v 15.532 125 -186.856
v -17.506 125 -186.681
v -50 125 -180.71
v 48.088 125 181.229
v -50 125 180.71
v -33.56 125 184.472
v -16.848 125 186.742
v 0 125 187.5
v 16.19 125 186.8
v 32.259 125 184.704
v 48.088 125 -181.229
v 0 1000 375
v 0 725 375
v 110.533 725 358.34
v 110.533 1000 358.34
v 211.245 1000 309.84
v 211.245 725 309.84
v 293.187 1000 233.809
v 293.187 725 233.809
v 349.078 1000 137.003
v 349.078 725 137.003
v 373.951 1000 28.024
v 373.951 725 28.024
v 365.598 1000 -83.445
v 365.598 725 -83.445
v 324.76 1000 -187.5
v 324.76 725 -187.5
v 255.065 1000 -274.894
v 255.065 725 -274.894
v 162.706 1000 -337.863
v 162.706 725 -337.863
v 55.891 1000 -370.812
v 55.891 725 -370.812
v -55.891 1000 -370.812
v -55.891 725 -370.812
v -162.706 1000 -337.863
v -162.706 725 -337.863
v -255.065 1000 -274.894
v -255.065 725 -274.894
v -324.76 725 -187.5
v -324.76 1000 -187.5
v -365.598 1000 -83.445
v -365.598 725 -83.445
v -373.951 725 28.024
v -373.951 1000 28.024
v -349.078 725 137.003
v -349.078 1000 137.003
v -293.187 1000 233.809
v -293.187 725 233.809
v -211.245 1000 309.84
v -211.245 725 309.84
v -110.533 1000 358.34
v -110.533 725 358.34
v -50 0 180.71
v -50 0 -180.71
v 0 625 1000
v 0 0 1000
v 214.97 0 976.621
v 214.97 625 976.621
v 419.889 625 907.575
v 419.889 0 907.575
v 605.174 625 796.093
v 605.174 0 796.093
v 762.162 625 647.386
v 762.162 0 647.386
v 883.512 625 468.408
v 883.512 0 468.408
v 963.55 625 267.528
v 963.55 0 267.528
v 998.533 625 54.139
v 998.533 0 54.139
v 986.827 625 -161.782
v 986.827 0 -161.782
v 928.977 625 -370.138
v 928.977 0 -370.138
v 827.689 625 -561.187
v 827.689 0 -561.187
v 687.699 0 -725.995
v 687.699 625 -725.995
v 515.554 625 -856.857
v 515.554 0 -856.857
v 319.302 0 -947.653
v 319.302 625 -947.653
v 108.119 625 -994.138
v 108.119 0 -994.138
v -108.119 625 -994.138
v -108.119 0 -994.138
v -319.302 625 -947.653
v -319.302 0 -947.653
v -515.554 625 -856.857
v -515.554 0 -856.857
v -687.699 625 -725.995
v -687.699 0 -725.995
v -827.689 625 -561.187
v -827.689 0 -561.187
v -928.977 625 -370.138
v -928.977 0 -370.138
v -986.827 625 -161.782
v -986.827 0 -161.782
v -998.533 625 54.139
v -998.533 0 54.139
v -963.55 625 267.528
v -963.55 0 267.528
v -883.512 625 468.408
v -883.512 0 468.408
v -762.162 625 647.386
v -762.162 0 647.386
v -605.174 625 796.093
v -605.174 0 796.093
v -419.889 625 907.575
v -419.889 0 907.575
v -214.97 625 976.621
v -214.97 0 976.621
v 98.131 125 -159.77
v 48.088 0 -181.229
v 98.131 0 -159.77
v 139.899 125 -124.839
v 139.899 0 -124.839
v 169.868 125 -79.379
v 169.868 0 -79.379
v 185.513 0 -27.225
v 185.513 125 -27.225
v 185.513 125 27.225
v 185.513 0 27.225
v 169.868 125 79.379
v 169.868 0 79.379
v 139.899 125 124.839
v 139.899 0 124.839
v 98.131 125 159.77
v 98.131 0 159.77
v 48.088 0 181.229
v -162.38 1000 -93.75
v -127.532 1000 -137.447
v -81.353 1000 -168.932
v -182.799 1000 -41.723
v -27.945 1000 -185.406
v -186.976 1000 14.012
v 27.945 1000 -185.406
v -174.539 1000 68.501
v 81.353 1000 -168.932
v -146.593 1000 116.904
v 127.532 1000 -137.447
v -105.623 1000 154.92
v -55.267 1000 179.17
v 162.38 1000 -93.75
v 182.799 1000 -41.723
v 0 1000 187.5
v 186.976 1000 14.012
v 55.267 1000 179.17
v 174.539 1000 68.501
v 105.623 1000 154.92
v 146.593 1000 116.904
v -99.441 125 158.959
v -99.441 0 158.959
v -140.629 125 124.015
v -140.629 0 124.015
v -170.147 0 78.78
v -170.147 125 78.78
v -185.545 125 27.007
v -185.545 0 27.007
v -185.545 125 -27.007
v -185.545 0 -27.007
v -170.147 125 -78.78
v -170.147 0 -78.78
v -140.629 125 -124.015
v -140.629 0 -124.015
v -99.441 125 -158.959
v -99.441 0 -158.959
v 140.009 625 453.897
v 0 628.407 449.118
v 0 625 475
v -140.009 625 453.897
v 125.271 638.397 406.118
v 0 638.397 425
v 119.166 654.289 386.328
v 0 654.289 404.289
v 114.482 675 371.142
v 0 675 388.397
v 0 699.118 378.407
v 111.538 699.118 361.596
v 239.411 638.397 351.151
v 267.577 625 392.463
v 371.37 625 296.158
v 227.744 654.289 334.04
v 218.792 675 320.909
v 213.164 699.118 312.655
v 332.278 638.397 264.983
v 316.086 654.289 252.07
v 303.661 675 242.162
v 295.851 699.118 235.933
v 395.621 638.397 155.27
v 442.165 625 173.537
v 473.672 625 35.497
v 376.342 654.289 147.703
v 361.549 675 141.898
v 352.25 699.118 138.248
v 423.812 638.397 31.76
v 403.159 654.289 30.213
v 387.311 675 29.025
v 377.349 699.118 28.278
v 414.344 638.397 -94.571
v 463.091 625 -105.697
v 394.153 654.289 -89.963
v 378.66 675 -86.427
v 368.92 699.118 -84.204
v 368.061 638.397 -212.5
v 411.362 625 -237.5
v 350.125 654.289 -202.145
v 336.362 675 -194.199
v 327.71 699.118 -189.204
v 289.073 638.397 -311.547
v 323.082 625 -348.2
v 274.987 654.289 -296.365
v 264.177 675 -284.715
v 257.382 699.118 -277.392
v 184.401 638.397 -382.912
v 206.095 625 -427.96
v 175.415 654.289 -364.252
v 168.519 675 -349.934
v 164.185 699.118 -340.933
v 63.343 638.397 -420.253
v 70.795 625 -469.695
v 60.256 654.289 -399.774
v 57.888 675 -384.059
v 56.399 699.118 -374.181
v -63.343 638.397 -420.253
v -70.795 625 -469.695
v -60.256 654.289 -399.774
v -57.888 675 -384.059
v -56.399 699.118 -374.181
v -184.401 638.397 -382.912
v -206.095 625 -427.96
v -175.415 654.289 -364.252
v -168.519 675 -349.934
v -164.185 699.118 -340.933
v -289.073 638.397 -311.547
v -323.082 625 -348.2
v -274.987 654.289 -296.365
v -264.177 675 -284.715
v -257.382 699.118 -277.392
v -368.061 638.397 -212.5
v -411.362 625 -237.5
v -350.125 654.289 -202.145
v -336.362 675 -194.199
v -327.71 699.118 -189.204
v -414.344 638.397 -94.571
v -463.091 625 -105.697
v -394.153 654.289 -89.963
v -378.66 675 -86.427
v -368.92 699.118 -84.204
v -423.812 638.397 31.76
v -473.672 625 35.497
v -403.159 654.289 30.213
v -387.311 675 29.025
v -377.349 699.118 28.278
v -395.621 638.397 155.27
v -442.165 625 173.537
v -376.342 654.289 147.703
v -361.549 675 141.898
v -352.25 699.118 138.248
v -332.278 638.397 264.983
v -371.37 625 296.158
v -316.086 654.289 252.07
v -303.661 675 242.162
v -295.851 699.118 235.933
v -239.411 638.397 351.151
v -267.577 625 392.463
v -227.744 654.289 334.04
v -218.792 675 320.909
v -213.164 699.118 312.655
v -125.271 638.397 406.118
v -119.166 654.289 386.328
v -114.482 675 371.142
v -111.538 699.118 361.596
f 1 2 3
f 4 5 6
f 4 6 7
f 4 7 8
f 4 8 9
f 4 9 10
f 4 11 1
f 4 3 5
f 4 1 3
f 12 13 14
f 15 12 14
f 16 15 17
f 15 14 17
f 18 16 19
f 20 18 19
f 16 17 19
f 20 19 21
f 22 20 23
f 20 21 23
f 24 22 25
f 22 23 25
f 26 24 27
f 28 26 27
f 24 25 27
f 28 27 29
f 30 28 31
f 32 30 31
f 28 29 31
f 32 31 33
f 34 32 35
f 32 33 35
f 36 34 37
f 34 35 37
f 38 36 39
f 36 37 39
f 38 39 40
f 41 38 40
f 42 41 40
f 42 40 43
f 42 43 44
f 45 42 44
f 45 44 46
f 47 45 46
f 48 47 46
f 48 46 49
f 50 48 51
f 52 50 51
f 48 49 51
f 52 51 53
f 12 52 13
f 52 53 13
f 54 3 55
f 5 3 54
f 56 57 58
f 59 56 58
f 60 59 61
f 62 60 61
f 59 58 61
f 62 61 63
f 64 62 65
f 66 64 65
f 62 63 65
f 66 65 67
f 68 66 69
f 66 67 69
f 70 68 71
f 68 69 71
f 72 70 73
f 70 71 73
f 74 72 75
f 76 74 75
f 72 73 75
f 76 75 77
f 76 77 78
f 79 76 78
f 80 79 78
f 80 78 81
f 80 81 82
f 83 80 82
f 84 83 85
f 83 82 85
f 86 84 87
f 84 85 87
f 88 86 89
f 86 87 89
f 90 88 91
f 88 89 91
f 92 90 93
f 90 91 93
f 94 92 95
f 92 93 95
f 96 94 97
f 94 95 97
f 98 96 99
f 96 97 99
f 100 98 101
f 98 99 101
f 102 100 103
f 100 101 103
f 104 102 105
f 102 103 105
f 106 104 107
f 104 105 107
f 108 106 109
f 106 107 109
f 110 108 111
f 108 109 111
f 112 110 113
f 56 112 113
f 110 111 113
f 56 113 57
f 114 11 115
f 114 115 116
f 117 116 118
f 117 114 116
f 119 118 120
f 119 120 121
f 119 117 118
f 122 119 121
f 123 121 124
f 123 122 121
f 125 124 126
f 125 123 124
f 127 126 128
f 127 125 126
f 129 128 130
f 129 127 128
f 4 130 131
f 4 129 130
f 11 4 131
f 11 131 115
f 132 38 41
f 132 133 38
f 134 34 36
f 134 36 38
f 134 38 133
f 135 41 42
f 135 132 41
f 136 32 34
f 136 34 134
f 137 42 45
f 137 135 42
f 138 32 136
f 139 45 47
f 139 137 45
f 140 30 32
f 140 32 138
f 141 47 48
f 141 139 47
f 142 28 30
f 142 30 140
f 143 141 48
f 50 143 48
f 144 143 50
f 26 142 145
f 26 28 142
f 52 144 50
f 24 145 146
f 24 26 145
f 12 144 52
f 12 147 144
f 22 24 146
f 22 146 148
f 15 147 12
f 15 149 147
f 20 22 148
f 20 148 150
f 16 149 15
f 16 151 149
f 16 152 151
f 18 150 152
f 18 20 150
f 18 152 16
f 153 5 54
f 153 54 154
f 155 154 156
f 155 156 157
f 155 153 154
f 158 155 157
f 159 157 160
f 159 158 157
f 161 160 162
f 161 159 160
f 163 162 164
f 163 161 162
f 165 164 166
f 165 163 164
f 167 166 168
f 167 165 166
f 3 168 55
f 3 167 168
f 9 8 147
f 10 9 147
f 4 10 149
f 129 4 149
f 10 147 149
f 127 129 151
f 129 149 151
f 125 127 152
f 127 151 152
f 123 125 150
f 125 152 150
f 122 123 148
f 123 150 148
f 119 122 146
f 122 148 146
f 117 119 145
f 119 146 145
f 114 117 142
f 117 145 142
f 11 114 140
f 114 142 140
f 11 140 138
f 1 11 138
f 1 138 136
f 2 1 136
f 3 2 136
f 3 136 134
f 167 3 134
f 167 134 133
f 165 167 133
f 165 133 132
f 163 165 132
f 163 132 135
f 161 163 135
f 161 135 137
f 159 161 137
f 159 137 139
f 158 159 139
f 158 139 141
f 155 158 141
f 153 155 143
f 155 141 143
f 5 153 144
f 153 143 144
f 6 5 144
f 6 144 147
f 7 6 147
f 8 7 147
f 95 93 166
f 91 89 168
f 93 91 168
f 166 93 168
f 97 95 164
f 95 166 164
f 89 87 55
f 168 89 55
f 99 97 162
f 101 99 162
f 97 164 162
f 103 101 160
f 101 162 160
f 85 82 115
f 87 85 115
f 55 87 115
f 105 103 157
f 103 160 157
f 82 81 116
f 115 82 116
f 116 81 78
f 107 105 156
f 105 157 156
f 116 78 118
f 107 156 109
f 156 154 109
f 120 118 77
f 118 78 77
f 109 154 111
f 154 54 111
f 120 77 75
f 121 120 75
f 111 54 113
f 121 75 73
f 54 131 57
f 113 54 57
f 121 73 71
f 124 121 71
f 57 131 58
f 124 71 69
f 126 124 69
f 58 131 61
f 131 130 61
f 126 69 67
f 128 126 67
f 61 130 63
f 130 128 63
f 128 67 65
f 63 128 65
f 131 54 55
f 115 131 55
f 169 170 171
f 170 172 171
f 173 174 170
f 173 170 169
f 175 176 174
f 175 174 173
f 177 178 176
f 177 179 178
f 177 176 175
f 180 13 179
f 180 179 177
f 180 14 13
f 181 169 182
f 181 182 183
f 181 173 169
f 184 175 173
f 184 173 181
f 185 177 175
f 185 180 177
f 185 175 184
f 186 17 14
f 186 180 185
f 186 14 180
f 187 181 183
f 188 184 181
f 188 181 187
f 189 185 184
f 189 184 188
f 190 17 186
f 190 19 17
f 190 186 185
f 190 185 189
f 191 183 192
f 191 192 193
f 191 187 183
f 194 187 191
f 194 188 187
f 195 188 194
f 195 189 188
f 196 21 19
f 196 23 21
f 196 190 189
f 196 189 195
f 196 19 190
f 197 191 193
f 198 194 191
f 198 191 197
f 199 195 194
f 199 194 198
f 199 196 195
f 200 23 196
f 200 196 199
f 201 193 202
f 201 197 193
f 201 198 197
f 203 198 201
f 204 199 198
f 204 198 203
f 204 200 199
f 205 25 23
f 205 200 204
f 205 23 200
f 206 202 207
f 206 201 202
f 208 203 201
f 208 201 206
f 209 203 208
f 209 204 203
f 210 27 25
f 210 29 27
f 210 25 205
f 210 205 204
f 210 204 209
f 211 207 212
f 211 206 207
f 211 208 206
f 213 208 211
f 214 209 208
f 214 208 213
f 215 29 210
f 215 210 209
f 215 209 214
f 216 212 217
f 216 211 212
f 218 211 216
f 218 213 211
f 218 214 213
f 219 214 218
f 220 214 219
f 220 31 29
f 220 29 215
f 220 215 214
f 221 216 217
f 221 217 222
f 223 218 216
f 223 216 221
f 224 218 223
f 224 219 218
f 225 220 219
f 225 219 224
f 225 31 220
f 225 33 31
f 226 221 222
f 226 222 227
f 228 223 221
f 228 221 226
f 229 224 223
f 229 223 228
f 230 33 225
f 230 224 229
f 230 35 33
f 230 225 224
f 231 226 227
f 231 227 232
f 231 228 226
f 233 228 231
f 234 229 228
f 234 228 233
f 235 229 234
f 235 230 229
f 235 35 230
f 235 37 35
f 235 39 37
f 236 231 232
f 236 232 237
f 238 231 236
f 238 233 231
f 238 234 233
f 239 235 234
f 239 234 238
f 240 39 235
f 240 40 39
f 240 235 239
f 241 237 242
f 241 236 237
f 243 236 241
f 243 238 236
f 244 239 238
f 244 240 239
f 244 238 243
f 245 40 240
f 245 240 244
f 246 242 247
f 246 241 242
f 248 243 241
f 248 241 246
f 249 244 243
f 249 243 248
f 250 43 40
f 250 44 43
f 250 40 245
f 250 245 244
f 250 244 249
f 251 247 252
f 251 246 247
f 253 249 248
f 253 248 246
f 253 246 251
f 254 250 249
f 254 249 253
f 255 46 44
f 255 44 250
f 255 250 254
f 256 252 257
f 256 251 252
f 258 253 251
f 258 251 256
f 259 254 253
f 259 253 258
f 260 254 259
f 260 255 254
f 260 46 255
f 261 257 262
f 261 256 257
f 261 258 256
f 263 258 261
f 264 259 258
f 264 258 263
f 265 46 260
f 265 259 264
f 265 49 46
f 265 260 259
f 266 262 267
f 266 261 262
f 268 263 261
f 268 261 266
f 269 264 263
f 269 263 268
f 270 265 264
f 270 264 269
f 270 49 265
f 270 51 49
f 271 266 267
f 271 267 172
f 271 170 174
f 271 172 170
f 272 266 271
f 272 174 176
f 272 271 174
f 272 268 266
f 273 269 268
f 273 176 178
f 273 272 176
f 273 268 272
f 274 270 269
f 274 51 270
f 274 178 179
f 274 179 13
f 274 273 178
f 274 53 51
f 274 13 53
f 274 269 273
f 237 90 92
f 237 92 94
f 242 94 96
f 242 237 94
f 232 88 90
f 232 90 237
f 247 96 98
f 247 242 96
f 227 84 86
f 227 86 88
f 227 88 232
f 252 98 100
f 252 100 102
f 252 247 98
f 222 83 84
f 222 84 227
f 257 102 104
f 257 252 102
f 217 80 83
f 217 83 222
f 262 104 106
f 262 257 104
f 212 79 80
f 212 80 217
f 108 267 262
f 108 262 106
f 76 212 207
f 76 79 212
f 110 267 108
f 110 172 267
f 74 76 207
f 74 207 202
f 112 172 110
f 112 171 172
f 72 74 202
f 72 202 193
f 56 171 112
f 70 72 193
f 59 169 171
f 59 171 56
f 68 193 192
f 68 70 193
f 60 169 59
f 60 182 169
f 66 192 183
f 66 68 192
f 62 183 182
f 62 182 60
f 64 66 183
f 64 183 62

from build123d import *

# Parameters (mm, degrees)
SKETCH1_R           = 1000
BOSS_EXTRUDE1_DEPTH = 625
SKETCH2_R           = 375
BOSS_EXTRUDE2_DEPTH = 375
FILLET1_R           = 100
SKETCH3_R           = 187.5
CUT_EXTRUDE1_DEPTH  = 875
CUT_EXTRUDE2_START  = -125
CUT_EXTRUDE2_DEPTH  = 125


with BuildPart() as part:
    # Sketch1 → Boss-Extrude1 (new body)
    with BuildSketch(Plane(origin=(0, 0, 0), x_dir=(1, 0, 0), z_dir=(0, 1, 0))):
        with Locations(Location((0, 0, 0), (0, 0, 270))):
            Circle(SKETCH1_R)
    extrude(amount=BOSS_EXTRUDE1_DEPTH)

    # Sketch2 → Boss-Extrude2 (add)
    with BuildSketch(Plane(origin=(0, 625, 0), x_dir=(1, 0, 0), z_dir=(0, 1, 0))):
        with Locations(Location((0, 0, 0), (0, 0, 270))):
            Circle(SKETCH2_R)
    extrude(amount=BOSS_EXTRUDE2_DEPTH)

    # Fillet1
    fillet1_edges = [part.edges().sort_by_distance(p)[0] for p in [
        (0, 625, -375),
    ]]
    fillet(fillet1_edges, radius=FILLET1_R)

    # Sketch3 → Cut-Extrude1 (cut)
    with BuildSketch(Plane(origin=(0, 1000, 0), x_dir=(1, 0, 0), z_dir=(0, 1, 0))):
        with Locations(Location((0, 0, 0), (0, 0, 270))):
            Circle(SKETCH3_R)
    extrude(amount=-CUT_EXTRUDE1_DEPTH, mode=Mode.SUBTRACT)

    # Sketch4 → Cut-Extrude2 (cut)
    with BuildSketch(Plane(origin=(0, 0, 0), x_dir=(-1, 0, 0), z_dir=(0, -1, 0)).offset(CUT_EXTRUDE2_START)):
        with BuildLine():
            Line((50, 180.710403685), (50, -180.710403685))
            ThreePointArc((50, -180.710403685), (187.5, 0), (50, 180.710403685))
        make_face()
        with BuildLine():
            ThreePointArc((-48.087593772, 181.228676884), (-187.5, 0), (-48.087593772, -181.228676884))
            Line((-48.087593772, -181.228676884), (-48.087593772, 181.228676884))
        make_face()
    extrude(amount=CUT_EXTRUDE2_DEPTH, mode=Mode.SUBTRACT)


solid = part.part
